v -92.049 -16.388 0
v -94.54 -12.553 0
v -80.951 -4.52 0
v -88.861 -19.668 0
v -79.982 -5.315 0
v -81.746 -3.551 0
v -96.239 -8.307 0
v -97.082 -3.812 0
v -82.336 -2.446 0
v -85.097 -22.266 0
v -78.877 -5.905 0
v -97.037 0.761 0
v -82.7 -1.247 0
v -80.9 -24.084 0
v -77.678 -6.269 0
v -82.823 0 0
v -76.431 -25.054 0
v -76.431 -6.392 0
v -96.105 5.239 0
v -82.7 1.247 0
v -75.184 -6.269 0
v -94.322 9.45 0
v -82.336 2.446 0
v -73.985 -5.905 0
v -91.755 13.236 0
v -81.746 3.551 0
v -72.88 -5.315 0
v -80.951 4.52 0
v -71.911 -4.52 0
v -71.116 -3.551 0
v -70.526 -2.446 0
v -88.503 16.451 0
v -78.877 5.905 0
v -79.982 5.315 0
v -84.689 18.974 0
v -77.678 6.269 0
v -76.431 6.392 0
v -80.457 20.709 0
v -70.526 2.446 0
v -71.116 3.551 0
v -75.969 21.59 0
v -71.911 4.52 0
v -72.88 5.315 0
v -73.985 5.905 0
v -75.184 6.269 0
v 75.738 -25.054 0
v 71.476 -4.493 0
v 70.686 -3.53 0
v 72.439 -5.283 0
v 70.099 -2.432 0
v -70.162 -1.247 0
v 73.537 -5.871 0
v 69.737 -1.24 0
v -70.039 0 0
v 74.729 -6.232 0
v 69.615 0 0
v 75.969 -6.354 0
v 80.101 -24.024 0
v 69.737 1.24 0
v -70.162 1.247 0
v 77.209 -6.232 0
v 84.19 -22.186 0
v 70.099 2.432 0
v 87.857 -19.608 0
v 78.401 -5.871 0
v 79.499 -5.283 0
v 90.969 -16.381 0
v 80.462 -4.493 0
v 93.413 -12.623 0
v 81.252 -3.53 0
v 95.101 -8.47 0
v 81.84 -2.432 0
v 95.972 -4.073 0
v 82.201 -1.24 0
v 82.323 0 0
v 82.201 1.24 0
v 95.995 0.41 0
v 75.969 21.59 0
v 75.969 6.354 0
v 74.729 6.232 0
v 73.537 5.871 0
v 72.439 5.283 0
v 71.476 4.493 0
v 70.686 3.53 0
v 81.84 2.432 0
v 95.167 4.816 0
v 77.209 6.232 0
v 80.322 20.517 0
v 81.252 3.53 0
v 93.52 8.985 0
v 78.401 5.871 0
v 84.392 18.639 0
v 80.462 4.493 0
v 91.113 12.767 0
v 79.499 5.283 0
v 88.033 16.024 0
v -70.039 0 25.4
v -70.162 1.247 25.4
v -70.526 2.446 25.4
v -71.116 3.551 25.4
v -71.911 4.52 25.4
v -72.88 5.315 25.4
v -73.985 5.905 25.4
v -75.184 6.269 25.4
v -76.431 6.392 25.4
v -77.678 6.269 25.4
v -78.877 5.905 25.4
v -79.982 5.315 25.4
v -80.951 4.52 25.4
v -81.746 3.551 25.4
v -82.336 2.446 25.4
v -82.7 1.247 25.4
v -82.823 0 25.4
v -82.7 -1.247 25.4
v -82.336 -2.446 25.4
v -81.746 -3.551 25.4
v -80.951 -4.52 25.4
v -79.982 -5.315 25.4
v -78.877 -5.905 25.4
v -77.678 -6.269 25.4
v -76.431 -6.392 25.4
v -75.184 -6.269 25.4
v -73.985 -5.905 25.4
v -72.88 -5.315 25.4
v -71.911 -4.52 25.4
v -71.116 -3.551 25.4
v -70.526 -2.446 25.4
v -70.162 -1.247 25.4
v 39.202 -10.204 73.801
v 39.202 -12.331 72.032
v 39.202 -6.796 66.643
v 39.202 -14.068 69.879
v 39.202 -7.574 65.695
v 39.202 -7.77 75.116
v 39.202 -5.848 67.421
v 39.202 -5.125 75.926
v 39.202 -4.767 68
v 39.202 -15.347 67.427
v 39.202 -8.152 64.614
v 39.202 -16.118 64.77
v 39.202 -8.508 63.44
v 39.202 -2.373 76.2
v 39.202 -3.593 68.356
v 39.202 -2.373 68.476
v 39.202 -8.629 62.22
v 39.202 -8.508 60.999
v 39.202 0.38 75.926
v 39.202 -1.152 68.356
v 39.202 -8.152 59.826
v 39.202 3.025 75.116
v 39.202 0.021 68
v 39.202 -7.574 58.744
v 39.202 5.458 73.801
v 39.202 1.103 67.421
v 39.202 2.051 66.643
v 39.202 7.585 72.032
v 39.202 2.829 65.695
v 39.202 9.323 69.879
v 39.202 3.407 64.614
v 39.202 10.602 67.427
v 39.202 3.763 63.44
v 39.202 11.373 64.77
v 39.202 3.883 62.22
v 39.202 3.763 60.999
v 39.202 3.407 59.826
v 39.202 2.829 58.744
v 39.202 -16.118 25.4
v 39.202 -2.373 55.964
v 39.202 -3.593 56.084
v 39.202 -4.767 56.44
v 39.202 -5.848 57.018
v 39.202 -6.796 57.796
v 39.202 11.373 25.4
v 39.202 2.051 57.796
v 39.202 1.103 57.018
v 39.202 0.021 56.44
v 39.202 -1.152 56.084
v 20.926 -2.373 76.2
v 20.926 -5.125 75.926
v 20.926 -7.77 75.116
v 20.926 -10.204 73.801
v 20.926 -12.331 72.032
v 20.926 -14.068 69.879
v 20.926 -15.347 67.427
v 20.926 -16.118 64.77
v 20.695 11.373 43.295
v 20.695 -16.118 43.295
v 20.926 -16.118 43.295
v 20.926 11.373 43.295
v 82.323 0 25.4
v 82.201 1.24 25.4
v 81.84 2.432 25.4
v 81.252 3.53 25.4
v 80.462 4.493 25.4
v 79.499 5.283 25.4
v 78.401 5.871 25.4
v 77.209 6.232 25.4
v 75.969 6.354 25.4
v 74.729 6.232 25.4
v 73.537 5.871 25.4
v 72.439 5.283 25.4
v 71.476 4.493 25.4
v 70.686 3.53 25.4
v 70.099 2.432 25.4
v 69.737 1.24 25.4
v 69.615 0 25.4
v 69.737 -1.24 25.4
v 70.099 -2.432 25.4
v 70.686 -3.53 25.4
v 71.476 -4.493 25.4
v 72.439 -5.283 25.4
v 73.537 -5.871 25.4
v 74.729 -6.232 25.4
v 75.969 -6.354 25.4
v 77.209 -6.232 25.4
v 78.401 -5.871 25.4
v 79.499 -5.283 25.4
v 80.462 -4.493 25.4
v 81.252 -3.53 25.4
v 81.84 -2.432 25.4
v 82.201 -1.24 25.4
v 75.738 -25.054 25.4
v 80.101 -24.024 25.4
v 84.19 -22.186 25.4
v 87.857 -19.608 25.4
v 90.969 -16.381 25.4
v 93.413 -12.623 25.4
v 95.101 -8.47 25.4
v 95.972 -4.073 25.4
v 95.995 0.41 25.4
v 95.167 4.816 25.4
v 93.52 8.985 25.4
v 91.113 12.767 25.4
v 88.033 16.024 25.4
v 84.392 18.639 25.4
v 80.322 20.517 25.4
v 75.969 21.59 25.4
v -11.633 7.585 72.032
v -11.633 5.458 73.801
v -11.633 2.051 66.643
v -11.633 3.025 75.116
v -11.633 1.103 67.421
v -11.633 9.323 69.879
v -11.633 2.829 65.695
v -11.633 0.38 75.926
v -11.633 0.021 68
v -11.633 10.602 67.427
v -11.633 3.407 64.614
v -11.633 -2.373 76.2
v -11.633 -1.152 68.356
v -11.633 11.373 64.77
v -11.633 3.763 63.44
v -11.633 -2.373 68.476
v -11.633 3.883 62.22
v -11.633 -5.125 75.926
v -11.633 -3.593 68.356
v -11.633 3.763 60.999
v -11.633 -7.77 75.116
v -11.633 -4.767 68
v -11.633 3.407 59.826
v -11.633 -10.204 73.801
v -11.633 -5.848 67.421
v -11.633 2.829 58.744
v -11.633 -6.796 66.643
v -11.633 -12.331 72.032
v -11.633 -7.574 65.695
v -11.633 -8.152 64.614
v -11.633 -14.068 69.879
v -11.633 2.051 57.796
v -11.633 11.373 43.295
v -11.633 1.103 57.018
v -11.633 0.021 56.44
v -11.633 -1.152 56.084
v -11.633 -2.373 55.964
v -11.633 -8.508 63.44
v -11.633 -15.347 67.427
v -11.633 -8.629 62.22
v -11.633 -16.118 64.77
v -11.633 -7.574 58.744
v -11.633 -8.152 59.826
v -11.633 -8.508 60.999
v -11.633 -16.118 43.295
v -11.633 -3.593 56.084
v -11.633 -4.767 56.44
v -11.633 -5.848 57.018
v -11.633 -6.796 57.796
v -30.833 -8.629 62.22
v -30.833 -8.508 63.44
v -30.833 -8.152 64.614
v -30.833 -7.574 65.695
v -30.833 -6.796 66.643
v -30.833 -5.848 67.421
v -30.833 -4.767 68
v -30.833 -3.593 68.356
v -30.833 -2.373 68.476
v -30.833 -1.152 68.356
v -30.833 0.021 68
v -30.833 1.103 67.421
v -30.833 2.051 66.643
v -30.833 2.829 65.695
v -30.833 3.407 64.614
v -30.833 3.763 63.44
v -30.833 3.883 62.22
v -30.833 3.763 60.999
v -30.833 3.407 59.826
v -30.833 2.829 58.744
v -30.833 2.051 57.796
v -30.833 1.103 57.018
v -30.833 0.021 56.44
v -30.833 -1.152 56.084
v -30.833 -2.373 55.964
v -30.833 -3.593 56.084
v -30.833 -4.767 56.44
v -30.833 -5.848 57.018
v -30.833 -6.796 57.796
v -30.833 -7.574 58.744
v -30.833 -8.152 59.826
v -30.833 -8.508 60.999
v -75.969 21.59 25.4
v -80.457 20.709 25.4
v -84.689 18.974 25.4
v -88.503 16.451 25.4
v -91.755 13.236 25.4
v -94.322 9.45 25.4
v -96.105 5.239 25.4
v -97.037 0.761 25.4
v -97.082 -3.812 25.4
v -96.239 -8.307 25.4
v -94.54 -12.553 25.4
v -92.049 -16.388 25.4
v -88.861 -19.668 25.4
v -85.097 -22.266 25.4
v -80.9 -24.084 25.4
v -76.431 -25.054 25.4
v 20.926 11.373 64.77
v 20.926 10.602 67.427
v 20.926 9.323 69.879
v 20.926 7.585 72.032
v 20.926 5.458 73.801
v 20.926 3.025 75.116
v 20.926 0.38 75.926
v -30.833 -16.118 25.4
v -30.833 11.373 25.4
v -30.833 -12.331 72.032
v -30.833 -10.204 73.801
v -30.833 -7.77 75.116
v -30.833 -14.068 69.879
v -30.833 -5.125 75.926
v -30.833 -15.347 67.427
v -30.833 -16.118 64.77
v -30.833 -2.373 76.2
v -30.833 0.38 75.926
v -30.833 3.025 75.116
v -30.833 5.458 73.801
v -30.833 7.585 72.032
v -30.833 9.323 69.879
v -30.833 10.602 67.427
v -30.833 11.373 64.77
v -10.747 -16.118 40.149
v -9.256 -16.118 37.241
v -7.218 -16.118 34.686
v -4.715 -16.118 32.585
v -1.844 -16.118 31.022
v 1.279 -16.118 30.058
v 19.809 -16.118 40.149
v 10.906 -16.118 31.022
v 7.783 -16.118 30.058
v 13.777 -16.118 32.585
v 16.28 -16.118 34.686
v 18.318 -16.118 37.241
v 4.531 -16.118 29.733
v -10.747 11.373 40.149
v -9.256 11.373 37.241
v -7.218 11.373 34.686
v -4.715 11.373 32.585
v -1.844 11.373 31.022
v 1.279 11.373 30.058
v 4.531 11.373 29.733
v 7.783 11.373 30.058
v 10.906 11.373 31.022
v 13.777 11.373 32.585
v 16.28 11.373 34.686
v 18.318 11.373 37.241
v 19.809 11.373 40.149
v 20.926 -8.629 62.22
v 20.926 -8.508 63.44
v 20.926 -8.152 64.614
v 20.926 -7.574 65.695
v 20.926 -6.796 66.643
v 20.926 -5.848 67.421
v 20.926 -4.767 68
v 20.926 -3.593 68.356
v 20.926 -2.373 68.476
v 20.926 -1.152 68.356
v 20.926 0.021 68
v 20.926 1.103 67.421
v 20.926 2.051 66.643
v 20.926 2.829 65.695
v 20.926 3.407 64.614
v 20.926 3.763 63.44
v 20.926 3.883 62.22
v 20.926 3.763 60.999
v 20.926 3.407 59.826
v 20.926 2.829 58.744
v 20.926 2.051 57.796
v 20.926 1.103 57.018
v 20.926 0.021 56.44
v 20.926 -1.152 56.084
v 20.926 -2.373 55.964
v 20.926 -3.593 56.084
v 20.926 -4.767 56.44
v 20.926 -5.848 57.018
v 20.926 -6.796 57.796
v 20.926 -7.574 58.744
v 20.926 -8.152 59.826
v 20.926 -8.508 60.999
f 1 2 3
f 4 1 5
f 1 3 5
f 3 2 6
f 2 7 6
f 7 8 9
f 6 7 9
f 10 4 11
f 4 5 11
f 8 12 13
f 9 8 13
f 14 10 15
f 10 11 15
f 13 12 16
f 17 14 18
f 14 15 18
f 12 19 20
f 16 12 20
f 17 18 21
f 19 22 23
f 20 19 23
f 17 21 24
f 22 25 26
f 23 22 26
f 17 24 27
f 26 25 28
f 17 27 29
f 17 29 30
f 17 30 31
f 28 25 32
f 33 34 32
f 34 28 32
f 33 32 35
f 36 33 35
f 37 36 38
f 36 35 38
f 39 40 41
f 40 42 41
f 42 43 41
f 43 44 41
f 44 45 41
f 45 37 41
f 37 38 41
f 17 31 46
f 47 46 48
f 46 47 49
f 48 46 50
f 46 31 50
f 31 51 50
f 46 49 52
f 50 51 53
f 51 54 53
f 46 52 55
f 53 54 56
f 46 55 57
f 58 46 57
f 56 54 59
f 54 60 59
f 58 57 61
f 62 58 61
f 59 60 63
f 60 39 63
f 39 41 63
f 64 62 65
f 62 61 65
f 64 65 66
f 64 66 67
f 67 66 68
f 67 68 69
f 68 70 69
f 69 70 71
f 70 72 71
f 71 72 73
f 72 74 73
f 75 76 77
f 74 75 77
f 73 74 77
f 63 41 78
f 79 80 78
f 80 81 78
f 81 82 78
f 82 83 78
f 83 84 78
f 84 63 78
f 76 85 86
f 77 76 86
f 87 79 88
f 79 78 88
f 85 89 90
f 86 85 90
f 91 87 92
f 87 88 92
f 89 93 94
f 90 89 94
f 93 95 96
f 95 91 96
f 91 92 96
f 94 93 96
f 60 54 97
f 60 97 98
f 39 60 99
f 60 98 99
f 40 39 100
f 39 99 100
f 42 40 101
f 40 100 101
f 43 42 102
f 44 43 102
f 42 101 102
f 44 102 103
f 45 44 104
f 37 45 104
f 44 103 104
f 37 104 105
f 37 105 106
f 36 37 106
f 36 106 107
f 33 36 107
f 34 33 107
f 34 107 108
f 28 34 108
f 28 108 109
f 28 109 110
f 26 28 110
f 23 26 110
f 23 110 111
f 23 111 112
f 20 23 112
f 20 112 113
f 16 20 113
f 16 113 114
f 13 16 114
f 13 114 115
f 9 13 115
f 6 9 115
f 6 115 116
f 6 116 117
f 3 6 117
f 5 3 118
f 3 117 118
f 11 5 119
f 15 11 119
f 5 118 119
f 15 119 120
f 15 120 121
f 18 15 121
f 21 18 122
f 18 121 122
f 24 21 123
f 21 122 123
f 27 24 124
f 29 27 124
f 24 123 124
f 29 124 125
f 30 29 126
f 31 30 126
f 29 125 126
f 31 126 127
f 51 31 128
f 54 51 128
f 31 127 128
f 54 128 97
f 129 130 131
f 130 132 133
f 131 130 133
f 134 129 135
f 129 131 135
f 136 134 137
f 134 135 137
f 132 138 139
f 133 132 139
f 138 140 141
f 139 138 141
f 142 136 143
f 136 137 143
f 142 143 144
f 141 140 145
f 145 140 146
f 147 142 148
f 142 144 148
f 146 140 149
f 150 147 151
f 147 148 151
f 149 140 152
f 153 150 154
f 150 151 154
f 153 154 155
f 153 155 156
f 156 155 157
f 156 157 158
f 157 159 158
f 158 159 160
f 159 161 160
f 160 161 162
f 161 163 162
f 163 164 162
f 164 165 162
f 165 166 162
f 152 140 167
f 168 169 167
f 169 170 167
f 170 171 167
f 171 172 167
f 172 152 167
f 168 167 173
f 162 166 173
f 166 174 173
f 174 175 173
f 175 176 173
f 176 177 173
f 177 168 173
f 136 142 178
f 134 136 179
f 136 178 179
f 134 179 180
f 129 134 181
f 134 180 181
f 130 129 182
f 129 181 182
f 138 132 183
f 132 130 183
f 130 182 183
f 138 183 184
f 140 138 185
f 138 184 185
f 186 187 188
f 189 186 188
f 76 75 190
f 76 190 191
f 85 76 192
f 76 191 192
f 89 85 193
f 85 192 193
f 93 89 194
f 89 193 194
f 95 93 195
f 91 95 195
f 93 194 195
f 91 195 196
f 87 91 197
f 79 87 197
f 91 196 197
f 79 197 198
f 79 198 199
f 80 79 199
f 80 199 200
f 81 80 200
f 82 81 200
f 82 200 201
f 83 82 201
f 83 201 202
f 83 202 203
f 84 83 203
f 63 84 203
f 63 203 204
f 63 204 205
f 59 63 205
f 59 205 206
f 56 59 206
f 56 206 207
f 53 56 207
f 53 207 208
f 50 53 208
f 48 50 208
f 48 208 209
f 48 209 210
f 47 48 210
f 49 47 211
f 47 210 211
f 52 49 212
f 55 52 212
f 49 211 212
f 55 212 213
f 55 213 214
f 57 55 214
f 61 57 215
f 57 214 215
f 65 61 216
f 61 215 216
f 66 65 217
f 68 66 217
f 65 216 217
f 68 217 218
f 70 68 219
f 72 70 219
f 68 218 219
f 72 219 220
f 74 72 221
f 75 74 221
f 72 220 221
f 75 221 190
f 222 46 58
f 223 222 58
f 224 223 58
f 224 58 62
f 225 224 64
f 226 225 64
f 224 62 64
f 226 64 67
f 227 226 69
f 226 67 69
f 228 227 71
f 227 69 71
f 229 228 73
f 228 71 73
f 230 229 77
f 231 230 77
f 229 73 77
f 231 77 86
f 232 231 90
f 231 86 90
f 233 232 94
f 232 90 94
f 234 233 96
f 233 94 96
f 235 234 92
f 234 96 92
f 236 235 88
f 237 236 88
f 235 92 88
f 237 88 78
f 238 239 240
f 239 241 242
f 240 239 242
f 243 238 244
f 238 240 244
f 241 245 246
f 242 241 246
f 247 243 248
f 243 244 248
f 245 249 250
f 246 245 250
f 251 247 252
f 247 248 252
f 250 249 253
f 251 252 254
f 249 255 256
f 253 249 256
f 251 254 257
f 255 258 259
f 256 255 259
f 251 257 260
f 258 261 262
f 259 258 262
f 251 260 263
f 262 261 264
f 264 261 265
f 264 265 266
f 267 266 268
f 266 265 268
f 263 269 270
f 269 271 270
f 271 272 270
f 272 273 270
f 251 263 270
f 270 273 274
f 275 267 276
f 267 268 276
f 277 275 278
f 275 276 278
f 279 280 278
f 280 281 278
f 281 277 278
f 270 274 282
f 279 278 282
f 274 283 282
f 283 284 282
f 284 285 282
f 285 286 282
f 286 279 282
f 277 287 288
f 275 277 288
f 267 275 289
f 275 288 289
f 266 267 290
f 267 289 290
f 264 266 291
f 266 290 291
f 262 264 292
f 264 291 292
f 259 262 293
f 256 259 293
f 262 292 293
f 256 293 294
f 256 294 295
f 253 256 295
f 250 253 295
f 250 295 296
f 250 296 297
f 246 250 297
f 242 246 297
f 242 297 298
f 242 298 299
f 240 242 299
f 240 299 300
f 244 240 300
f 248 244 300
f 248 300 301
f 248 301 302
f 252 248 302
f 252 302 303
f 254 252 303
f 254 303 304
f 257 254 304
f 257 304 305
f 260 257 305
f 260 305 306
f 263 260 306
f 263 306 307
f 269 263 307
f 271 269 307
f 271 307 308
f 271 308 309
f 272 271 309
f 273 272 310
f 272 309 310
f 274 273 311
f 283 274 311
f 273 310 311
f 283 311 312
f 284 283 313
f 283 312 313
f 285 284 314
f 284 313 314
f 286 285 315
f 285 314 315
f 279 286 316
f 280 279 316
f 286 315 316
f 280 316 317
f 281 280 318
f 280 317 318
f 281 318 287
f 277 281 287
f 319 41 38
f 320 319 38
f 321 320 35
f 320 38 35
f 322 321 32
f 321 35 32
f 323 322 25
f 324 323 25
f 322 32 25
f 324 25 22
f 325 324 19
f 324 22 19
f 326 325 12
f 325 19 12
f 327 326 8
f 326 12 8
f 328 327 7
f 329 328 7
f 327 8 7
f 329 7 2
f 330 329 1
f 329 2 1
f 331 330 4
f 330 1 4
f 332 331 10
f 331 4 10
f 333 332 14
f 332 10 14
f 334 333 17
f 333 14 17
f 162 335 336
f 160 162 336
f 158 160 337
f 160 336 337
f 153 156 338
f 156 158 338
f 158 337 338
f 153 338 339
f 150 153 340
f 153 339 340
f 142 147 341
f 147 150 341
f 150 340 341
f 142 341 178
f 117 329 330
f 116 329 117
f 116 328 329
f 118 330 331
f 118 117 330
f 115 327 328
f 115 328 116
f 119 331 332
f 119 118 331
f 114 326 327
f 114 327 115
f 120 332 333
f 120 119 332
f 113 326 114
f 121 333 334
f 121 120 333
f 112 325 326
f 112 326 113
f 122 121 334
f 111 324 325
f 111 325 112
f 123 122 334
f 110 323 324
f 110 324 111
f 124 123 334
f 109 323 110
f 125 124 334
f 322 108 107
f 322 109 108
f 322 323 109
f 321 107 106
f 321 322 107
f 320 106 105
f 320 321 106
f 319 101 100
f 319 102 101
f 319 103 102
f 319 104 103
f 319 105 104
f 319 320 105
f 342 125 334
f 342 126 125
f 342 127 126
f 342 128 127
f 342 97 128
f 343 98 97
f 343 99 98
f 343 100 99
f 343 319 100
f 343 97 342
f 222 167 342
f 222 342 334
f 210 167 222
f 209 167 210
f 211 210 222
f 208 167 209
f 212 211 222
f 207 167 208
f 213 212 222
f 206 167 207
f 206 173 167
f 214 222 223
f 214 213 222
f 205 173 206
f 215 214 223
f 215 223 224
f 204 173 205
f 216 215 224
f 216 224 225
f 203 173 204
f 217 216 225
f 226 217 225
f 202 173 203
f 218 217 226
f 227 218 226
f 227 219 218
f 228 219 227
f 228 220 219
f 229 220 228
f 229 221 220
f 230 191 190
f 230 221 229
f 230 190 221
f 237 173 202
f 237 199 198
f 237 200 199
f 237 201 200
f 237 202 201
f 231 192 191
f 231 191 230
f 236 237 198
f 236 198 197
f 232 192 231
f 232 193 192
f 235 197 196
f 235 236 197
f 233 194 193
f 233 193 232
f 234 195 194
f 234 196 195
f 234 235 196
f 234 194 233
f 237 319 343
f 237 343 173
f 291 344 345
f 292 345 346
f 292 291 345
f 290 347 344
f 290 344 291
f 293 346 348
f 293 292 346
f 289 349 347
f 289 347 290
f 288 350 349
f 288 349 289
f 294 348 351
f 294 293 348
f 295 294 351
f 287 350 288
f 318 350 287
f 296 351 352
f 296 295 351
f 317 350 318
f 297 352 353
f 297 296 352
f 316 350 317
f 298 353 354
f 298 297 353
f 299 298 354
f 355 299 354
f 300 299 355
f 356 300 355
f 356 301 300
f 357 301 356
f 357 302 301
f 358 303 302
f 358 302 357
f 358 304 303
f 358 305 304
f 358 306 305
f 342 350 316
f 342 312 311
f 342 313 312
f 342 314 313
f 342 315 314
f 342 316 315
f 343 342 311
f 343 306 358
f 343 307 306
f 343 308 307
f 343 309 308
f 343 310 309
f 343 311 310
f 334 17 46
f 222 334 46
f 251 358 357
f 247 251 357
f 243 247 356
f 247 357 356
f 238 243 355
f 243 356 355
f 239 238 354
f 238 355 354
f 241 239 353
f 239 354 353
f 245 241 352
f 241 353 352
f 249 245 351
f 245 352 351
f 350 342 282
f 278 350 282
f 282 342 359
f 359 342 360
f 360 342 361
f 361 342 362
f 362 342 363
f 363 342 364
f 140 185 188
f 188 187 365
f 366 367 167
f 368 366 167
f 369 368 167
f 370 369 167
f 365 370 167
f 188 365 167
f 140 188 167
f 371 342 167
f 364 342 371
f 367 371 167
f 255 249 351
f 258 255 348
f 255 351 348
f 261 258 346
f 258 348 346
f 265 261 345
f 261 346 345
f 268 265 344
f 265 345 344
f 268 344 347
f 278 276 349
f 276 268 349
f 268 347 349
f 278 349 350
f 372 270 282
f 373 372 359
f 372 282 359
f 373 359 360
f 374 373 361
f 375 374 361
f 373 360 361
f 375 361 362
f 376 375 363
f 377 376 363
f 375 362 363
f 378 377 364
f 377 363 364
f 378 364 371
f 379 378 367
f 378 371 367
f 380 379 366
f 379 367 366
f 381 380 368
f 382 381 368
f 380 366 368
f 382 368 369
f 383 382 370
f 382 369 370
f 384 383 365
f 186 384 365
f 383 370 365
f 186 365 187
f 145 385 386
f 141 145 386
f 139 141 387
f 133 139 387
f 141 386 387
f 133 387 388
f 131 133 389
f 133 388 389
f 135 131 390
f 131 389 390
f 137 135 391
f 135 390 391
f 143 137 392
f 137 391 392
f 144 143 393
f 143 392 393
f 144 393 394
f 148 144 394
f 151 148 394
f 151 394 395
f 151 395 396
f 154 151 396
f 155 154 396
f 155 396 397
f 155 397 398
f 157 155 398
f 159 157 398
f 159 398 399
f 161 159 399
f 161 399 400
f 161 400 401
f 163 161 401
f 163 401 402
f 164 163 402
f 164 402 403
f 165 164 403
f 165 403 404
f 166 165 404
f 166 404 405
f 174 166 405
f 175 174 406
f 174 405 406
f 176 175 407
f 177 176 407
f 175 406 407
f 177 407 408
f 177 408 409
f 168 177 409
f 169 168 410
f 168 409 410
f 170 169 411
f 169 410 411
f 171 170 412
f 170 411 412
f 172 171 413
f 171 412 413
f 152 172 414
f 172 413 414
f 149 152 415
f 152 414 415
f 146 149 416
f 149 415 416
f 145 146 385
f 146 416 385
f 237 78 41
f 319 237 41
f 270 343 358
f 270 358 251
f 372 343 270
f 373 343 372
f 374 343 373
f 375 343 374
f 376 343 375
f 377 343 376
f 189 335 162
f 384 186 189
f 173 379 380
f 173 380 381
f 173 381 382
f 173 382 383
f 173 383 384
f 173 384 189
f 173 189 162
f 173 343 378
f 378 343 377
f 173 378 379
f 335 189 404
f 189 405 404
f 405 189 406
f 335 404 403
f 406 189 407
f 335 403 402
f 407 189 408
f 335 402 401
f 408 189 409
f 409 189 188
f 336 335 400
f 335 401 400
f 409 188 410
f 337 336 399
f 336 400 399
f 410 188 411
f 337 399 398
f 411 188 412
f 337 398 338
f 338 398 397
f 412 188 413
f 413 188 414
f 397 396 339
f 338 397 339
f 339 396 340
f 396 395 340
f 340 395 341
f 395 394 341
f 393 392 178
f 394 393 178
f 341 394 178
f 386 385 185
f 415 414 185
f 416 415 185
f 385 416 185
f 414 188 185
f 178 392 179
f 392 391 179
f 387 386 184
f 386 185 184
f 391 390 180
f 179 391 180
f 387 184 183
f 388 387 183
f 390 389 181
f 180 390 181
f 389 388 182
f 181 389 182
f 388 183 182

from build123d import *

# Parameters (mm, degrees)
F1_DEPTH  = 25.4
F2_R      = 6.3918462825
F3_DEPTH  = 25.401
F4_R      = 6.3541975942
F5_DEPTH  = 25.401
F6_W      = 70.0357761234
F6_H      = 27.4913627654
F7_DEPTH  = 50.8
F9_DEPTH  = 126.9250129275
F10_R     = 6.2560049958
F11_DEPTH = 126.9250129275
F13_DEPTH = 37.709375603


with BuildPart() as f1:
    # F0 (on Top) → F1 (new body)
    with BuildSketch(Plane.XY):
        with BuildLine():
            Line((75.9690925479, 21.5900018811), (-75.9690925479, 21.5900018811))
            ThreePointArc((-75.9690925479, 21.5900018811), (-97.1712359727, -1.524181319), (-76.4309093356, -25.0536352396))
            Line((-76.4309093356, -25.0536352396), (75.738184154, -25.0536352396))
            ThreePointArc((75.738184154, -25.0536352396), (96.0904147546, -1.8319984366), (75.9690925479, 21.5900018811))
        make_face()
    extrude(amount=F1_DEPTH)

    # F2 (on face) → F3 (cut, through all)
    with BuildSketch(Plane.XY.offset(25.4)):
        with Locations((-76.4309093356, 0)):
            Circle(F2_R)
    extrude(amount=-F3_DEPTH, mode=Mode.SUBTRACT)

    # F4 (on face) → F5 (cut, through all)
    with BuildSketch(Plane.XY.offset(25.4)):
        with Locations((75.9690925479, 0)):
            Circle(F4_R)
    extrude(amount=-F5_DEPTH, mode=Mode.SUBTRACT)

    # F6 (on face) → F7 (join)
    with BuildSketch(Plane.XY.offset(25.4)):
        with Locations((4.1845785454, -2.3726923391)):
            Rectangle(F6_W, F6_H)
    extrude(amount=F7_DEPTH)

    # F8 (on face) → F9 (cut, through all)
    with BuildSketch(Plane(origin=(-30.8333095163, 0, 0), x_dir=(0, -1, 0), z_dir=(-1, 0, 0))):
        with BuildLine():
            ThreePointArc((-11.3729890436, 64.7699981928), (-6.5658296023, 72.9691803573), (2.3726923391, 76.2))
            Line((2.3726923391, 76.2), (-11.3729890436, 76.2))
            Line((-11.3729890436, 76.2), (-11.3729890436, 64.7699981928))
        make_face()
        with BuildLine():
            Line((16.1183737218, 76.2), (2.3726923391, 76.2))
            ThreePointArc((2.3726923391, 76.2), (11.3112142805, 72.9691803573), (16.1183737218, 64.7699981928))
            Line((16.1183737218, 64.7699981928), (16.1183737218, 76.2))
        make_face()
    extrude(amount=-F9_DEPTH, mode=Mode.SUBTRACT)

    # F10 (on face) → F11 (cut, through all)
    with BuildSketch(Plane(origin=(-30.8333095163, 0, 0), x_dir=(0, -1, 0), z_dir=(-1, 0, 0))):
        with Locations((2.3726923391, 62.2197442057)):
            Circle(F10_R)
    extrude(amount=-F11_DEPTH, mode=Mode.SUBTRACT)

    # F12 (on face) → F13 (cut, through all)
    with BuildSketch(Plane.XZ.offset(16.1183737218)):
        Polygon((-11.6325737908, 78.8554549217), (-11.6325737908, 43.2954542339), (20.6946991384, 43.2954542339), (20.9256093949, 43.2954542339), (20.9256093949, 78.8554549217), align=None)
        with BuildLine():
            Line((20.6946991384, 43.2954542339), (-11.6325737908, 43.2954542339))
            ThreePointArc((-11.6325737908, 43.2954542339), (4.5310626738, 29.7328506966), (20.6946991384, 43.2954542339))
        make_face()
    extrude(amount=-F13_DEPTH, mode=Mode.SUBTRACT)


solid = f1.part
